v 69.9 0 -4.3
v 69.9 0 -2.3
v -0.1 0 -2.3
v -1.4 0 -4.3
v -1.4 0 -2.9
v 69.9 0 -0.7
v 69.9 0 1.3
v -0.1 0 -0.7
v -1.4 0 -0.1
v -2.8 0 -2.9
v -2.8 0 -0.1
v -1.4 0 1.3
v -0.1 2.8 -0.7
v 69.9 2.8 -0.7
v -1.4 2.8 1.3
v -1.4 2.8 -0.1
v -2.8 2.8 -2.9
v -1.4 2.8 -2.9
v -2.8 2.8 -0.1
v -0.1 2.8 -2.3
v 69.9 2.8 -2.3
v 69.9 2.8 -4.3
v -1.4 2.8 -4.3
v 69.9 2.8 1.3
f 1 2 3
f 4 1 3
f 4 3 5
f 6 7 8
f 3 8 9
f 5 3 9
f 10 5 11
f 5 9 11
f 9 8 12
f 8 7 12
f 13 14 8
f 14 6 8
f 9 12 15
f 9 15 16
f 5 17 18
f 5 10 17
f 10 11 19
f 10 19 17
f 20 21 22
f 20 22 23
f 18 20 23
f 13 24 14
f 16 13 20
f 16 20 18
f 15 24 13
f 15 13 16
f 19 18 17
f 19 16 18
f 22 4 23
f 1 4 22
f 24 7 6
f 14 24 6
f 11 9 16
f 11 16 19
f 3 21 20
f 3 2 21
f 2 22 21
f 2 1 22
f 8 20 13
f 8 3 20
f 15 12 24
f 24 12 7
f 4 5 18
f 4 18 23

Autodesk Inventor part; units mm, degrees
ref_plane "YZ Plane" through (0, 0, 0) normal (1, 0, 0) x (0, 1, 0)
ref_plane "XZ Plane" through (0, 0, 0) normal (0, 1, 0) x (-1, 0, 0)
ref_plane "XY Plane" through (0, 0, 0) normal (0, 0, 1) x (1, 0, 0)
sketch "Sketch1" plane through (0, 0, 0) normal (0, 1, 0) x (-1, 0, 0)
  line L0 (2.9, 0) -> (2.9, -3) projected
  line L1 (1.5, 0) -> (2.9, 0) projected
  line L2 (1.5, 1.4) -> (1.5, 0) projected
  line L3 (0, 1.4) -> (1.5, 1.4) projected
  line L4 (0, -4.4) -> (0, 1.4) projected
  line L5 (1.5, -4.4) -> (0, -4.4) projected
  line L6 (1.5, -3) -> (1.5, -4.4) projected
  line L7 (1.5, -3) -> (2.9, -3) projected
  line L8 (0.1, -4.3) -> (0.1, 1.3)
  line L9 (0.1, 1.3) -> (1.4, 1.3)
  line L10 (1.4, 1.3) -> (1.4, -0.1)
  line L11 (1.4, -0.1) -> (2.8, -0.1)
  line L12 (2.8, -0.1) -> (2.8, -2.9)
  line L13 (2.8, -2.9) -> (1.4, -2.9)
  line L14 (1.4, -2.9) -> (1.4, -4.3)
  line L15 (1.4, -4.3) -> (0.1, -4.3)
  line L16 (0.1, -4.3) -> (-69.9, -4.3)
  line L17 (-69.9, -4.3) -> (-69.9, -2.3)
  line L18 (-69.9, -2.3) -> (0.1, -2.3)
  line L19 (0.1, -2.3) -> (0.1, -4.3)
  line L20 (0.1, 1.3) -> (-69.9, 1.3)
  line L21 (-69.9, 1.3) -> (-69.9, -0.7)
  line L22 (-69.9, -0.7) -> (0.1, -0.7)
  line L23 (0.1, -0.7) -> (0.1, 1.3)
  point P0 (0, 0)
  point P1 (0.1, -0.7)
  point P2 (0.1, -2.3)
  dimension "d0" = 0.1
  dimension "d1" = 1.6
  dimension "d2" = 70
extrude "Extrusion1" add sketch "Sketch1" along normal blind 2.8 contours L20 L8 L22 L4 | L4 L22 L21 L20 | L16 L17 L18 L4 | L4 L18 L8 L16 | L9 L10 L11 L12 L13 L14 L15 L8
equation "\"d0\" = slack"
equation "\"slack\" = 0.1"
equation "\"slack2\" = 0.1"
properties part number "Widełki"
